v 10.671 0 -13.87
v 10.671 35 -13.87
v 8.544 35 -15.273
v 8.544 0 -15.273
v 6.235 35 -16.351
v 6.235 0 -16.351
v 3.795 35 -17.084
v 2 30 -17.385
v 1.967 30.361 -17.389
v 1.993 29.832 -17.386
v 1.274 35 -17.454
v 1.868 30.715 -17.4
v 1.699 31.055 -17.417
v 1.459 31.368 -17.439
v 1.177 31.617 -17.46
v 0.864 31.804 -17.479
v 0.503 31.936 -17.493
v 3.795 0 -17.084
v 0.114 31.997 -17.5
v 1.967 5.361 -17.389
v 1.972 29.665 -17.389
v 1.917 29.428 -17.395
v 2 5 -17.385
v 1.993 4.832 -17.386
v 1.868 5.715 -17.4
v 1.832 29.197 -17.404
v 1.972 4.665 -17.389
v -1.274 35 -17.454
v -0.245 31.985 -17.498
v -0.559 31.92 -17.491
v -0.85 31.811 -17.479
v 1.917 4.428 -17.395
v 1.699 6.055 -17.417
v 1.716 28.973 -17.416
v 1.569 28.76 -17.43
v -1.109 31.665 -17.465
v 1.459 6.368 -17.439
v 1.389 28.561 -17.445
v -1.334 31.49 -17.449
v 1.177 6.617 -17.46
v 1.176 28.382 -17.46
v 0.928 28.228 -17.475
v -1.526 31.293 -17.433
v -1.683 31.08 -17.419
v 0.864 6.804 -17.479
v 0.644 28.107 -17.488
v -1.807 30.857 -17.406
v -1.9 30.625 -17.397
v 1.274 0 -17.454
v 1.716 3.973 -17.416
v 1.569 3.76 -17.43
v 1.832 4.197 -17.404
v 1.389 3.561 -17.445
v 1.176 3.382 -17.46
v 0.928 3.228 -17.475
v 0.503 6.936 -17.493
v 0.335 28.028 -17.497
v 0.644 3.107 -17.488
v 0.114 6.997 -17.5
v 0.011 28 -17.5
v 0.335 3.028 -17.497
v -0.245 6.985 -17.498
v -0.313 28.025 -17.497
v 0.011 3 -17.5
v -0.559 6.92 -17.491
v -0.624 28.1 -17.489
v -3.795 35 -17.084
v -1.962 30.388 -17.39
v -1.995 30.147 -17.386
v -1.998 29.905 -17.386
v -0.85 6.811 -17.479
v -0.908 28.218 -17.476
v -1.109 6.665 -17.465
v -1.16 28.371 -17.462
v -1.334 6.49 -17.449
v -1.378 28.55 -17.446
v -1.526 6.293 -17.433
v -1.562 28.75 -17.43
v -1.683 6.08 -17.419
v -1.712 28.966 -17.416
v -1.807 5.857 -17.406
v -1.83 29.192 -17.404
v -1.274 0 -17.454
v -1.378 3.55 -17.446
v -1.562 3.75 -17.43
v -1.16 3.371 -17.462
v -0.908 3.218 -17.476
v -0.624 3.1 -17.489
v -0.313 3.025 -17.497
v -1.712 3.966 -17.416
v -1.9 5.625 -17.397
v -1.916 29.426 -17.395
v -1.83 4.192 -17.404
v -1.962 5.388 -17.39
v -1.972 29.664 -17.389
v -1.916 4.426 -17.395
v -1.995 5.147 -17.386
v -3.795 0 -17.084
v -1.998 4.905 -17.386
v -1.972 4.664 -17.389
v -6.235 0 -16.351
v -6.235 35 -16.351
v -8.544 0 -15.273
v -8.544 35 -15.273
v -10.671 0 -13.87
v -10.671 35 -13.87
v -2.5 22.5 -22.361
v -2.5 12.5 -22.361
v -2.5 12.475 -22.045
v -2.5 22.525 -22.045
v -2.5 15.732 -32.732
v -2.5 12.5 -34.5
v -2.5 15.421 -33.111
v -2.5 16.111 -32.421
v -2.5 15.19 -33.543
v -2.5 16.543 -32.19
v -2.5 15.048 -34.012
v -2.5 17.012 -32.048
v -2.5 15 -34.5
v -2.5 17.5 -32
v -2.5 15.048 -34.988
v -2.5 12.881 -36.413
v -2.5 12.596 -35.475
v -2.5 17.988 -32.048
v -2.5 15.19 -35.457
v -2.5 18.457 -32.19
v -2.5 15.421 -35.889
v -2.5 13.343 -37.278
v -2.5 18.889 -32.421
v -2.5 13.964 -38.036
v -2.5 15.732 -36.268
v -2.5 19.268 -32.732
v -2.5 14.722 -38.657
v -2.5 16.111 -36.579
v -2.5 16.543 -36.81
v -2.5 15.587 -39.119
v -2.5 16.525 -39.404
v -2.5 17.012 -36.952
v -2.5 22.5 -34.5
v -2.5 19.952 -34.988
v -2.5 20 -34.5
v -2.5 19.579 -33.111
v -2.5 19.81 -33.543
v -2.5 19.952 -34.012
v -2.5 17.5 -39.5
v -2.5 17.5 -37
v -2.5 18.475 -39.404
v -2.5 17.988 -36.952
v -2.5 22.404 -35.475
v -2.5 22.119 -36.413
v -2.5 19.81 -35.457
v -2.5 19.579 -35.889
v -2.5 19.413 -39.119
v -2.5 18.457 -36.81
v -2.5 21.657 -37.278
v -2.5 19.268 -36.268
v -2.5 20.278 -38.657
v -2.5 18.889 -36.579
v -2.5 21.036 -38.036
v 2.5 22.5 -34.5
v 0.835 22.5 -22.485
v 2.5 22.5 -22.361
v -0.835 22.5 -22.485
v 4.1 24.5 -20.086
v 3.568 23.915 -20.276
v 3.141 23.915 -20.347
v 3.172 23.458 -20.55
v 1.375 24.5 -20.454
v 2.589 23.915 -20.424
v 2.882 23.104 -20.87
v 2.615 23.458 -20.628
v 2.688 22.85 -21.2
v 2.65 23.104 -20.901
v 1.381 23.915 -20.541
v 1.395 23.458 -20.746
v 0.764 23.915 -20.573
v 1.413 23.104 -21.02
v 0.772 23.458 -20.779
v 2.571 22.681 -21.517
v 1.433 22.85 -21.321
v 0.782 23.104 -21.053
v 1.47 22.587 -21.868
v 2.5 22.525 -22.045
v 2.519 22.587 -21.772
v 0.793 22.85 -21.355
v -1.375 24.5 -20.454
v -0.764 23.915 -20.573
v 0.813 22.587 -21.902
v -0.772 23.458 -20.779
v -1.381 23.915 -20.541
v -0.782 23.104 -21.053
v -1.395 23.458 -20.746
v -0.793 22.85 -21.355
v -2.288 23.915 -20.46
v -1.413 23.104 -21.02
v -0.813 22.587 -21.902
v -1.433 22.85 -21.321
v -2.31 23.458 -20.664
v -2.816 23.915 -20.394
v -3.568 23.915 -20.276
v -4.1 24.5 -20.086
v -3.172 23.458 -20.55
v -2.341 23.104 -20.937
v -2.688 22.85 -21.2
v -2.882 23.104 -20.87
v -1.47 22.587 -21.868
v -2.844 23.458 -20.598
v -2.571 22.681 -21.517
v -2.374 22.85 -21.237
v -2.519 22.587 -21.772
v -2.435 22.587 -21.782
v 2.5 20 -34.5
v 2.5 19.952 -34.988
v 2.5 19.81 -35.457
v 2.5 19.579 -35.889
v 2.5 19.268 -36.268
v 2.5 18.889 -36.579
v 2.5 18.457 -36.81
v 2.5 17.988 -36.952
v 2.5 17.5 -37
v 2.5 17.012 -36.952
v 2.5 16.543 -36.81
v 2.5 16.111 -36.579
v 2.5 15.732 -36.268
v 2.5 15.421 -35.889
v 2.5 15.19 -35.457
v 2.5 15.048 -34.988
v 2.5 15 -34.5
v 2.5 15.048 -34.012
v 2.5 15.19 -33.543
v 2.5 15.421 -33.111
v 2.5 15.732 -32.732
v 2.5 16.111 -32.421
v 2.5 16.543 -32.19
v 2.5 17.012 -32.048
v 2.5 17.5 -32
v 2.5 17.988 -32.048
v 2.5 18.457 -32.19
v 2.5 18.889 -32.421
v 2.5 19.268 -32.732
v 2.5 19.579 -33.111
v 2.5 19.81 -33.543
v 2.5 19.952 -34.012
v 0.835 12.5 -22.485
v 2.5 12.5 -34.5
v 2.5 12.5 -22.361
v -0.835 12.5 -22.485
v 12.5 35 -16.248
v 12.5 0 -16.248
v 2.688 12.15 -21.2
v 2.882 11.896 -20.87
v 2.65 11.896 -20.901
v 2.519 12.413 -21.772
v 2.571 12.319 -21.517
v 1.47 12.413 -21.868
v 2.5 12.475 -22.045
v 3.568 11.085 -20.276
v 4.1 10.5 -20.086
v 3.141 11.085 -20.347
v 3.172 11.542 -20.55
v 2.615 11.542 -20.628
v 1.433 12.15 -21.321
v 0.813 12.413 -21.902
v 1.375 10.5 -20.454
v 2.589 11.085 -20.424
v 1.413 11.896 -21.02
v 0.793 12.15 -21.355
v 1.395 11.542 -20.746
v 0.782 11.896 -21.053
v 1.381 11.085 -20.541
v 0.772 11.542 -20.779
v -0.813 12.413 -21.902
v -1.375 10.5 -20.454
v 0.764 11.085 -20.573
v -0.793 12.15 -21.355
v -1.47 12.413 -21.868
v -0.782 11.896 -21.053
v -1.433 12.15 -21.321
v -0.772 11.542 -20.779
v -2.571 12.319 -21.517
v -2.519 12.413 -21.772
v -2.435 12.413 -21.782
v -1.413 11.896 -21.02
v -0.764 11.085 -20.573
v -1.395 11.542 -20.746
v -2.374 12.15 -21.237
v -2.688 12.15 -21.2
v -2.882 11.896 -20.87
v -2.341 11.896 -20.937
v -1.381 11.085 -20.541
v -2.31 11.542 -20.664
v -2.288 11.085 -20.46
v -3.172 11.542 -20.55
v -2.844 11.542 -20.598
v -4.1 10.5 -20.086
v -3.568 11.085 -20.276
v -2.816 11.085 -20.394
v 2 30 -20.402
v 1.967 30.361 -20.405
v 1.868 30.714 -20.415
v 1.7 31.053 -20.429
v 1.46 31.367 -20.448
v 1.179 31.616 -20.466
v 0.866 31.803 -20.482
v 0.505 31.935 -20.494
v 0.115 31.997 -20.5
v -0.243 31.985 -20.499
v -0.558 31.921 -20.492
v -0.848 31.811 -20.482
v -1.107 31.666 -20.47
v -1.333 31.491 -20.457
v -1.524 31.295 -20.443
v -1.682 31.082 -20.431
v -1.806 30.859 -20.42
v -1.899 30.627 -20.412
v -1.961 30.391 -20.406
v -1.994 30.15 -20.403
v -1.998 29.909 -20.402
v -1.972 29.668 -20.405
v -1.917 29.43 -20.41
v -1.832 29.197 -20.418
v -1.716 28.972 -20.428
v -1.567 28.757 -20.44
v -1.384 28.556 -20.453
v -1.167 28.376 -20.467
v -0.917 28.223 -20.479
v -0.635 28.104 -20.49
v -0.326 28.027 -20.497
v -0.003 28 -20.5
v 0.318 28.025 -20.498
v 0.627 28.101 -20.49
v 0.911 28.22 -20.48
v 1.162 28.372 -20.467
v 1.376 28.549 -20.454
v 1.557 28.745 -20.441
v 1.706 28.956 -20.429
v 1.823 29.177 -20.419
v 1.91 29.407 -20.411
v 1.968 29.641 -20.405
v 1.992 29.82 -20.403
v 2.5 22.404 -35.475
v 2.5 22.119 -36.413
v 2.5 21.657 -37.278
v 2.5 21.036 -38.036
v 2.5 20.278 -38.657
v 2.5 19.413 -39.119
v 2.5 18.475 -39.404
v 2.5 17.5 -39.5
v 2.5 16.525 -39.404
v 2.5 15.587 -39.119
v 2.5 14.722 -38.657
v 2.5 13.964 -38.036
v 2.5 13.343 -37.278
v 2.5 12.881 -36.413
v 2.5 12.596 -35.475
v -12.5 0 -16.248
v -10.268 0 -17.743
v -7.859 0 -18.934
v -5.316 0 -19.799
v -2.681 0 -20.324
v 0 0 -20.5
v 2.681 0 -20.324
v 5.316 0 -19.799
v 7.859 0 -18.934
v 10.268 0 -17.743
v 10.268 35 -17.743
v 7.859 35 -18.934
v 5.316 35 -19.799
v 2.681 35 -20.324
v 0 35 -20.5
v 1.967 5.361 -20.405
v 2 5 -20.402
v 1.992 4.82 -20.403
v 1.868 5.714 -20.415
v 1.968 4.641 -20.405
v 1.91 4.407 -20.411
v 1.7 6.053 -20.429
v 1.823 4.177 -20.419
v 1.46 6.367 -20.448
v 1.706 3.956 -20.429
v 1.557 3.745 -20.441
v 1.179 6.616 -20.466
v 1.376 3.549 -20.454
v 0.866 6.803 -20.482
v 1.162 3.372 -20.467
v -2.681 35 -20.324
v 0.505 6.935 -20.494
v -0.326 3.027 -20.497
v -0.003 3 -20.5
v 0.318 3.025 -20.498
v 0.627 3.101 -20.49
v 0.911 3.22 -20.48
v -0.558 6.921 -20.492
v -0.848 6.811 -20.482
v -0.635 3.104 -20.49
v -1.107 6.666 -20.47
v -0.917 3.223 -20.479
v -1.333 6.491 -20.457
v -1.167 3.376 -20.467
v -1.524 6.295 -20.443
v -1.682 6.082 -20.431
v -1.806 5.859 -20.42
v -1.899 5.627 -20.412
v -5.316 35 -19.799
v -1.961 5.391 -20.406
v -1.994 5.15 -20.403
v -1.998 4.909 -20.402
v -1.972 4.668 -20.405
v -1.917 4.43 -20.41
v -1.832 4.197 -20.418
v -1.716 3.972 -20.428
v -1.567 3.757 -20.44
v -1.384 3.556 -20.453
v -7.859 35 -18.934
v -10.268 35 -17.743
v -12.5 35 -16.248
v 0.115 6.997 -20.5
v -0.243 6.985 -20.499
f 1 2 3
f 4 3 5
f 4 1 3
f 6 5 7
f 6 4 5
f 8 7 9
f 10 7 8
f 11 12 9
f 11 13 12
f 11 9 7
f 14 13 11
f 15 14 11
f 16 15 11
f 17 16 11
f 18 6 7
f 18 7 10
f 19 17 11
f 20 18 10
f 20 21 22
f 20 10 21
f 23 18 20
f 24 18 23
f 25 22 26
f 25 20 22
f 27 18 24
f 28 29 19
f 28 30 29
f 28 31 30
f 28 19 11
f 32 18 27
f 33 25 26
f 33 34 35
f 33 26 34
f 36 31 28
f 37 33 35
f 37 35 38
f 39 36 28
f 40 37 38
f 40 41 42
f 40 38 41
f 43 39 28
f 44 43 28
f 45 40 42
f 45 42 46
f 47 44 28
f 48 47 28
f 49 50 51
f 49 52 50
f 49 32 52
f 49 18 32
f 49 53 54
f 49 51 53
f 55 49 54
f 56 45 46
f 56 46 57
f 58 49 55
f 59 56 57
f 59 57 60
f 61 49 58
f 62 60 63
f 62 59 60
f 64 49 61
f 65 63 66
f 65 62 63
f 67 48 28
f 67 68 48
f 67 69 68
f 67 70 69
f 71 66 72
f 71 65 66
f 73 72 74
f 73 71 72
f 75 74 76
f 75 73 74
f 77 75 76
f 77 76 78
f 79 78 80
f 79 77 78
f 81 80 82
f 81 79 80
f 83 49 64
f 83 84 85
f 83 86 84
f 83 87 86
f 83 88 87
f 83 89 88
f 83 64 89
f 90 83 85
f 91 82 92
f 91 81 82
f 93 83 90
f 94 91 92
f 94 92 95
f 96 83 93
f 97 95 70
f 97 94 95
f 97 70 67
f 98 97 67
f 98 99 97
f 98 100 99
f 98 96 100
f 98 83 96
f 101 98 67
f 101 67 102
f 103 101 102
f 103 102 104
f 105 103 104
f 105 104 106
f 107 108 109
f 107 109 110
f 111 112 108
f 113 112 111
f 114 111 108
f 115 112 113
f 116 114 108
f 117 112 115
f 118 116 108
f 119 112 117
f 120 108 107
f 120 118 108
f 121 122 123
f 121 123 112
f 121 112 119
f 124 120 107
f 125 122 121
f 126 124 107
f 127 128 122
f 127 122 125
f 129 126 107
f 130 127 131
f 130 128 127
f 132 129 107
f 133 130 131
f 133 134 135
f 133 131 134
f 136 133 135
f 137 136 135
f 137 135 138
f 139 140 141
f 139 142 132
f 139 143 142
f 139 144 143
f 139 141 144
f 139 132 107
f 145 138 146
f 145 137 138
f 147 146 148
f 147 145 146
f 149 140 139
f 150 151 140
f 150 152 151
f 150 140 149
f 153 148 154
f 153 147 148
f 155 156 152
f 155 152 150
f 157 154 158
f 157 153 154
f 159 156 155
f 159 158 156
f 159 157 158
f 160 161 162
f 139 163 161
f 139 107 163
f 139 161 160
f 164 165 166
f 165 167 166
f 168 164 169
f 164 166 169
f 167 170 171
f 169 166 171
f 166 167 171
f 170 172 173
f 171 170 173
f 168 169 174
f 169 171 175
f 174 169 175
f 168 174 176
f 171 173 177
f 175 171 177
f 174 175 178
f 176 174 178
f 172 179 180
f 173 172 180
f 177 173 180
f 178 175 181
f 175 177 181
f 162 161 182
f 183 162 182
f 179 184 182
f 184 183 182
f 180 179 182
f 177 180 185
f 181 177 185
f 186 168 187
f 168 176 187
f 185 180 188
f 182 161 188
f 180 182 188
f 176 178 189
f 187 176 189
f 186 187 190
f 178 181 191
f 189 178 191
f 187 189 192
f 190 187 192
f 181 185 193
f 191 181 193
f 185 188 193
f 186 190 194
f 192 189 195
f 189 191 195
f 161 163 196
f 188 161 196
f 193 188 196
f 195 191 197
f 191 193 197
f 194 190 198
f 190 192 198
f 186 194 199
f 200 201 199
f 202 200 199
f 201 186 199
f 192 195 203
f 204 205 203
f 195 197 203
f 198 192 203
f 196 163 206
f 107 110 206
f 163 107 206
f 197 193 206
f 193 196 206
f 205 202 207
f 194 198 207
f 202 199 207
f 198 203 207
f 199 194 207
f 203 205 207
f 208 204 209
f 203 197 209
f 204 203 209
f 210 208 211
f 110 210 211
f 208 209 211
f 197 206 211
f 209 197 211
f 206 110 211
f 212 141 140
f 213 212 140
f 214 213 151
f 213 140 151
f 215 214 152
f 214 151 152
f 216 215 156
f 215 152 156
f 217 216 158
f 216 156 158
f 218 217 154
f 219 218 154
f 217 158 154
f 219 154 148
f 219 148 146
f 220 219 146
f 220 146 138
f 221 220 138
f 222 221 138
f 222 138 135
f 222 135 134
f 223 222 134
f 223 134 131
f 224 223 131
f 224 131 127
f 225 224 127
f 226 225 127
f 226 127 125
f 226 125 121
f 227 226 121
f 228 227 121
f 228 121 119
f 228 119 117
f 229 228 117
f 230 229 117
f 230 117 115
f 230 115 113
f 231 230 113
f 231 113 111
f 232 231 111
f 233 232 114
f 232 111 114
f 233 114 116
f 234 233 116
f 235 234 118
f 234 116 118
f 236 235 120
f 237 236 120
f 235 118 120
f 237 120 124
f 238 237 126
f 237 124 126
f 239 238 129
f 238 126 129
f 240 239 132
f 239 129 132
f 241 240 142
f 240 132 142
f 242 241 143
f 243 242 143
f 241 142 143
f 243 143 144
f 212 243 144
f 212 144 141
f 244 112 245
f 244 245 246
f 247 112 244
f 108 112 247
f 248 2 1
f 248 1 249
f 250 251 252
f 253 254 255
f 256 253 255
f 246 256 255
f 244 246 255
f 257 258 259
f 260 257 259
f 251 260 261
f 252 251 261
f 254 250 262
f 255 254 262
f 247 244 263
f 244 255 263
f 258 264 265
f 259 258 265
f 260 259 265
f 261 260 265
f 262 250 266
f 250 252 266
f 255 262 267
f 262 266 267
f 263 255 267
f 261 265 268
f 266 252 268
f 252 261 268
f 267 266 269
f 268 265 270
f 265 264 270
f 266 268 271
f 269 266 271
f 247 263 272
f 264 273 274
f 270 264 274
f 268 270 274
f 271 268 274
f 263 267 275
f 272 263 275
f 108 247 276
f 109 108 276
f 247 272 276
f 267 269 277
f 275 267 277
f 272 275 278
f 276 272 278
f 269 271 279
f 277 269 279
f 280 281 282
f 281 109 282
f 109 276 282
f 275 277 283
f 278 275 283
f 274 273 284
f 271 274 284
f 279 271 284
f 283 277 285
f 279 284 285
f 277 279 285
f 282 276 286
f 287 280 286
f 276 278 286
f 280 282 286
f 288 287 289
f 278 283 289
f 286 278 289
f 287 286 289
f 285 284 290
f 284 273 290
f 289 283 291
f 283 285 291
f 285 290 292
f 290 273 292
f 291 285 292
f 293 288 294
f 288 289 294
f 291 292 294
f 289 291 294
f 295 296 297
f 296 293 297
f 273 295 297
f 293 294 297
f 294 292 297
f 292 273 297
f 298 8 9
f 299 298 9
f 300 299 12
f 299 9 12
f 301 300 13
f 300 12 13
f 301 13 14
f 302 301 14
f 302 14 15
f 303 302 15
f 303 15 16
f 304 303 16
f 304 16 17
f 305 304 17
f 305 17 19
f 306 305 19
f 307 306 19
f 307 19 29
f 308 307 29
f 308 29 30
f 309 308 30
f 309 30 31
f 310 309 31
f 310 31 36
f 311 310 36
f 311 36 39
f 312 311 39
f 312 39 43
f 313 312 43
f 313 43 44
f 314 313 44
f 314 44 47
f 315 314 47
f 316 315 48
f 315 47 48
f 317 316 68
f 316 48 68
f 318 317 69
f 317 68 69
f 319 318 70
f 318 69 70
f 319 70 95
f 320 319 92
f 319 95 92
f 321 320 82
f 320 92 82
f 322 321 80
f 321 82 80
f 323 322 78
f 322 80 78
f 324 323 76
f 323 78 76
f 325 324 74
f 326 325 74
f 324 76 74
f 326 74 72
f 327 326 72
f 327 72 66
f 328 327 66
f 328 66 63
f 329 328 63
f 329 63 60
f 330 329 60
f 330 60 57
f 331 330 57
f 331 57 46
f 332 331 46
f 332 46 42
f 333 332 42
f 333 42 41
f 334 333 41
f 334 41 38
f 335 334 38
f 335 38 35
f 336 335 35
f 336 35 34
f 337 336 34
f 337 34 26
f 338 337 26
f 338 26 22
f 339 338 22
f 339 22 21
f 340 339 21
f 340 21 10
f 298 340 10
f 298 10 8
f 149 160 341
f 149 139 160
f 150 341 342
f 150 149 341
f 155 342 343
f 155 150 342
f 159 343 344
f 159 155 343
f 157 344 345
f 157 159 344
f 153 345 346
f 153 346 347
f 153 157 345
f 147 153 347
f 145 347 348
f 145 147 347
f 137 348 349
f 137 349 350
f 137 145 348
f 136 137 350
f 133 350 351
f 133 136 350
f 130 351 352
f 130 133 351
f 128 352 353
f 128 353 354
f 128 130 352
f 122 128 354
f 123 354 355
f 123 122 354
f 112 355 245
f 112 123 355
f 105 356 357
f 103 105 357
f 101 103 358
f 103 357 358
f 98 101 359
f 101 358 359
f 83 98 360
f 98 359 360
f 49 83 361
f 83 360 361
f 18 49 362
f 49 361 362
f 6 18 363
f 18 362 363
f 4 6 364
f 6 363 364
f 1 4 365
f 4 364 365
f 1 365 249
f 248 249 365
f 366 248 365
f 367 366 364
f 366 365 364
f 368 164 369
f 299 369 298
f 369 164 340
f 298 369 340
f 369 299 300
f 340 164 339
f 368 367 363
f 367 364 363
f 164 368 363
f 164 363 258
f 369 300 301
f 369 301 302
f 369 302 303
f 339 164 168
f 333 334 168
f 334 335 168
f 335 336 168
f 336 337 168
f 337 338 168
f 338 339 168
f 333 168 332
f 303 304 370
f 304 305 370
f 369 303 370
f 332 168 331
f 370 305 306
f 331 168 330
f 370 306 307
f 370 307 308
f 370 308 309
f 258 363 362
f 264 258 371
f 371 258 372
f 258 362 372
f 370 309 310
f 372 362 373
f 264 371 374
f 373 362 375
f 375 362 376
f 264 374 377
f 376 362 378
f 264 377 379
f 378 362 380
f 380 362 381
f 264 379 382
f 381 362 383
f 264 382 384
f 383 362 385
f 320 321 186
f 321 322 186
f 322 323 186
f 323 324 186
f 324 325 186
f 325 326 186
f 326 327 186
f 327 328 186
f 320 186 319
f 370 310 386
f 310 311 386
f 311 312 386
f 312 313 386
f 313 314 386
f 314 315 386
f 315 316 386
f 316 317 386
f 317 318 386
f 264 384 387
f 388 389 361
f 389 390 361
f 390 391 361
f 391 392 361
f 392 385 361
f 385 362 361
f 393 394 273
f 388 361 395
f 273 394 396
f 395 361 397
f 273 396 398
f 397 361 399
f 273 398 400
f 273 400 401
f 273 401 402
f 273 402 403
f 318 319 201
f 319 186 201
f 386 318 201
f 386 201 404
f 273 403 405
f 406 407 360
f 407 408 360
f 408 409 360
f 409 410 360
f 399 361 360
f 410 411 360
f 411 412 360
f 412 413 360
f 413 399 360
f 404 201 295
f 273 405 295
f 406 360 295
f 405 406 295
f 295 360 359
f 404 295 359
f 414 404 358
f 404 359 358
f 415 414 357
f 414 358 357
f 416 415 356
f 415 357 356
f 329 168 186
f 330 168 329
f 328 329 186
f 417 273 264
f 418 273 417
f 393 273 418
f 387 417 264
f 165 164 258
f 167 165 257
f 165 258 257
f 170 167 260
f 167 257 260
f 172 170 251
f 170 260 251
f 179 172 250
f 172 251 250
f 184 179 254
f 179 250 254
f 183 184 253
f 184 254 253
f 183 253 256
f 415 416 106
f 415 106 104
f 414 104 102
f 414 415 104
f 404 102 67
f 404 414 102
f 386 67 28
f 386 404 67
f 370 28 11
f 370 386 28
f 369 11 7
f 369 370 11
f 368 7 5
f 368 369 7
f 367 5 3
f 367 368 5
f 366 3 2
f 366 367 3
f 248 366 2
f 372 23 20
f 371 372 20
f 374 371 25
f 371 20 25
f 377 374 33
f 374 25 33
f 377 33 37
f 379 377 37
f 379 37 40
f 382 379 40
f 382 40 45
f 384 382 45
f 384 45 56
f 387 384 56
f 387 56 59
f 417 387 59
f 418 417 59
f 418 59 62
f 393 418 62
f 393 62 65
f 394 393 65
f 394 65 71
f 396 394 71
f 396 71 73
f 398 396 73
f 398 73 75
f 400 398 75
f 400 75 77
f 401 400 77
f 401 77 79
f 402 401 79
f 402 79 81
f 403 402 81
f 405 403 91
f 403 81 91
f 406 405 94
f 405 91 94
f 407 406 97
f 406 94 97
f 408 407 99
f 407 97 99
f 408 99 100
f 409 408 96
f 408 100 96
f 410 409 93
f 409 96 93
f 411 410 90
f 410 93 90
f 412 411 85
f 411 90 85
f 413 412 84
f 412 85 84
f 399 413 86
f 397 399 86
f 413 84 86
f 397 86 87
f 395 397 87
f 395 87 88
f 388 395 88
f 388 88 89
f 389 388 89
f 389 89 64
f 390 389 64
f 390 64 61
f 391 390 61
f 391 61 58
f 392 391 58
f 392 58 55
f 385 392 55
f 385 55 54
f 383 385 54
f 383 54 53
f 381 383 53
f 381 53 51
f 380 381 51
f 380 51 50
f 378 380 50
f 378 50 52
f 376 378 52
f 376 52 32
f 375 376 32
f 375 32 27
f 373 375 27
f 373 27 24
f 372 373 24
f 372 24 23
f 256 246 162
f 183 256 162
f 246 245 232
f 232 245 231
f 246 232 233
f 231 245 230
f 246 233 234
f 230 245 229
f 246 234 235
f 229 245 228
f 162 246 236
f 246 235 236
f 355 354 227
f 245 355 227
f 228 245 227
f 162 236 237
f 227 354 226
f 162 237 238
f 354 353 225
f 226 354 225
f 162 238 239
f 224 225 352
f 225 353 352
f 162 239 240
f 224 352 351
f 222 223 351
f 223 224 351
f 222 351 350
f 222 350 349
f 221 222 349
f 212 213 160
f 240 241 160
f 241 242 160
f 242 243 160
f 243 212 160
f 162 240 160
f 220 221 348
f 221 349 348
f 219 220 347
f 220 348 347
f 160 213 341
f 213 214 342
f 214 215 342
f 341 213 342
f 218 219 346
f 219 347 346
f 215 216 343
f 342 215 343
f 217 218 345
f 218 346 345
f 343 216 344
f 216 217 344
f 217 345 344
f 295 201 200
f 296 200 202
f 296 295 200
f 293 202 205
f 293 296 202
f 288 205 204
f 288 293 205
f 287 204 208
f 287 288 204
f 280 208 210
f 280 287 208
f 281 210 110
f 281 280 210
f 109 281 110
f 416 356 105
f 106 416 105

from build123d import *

# Parameters (mm, degrees)
SKETCH2_R                = 20.5
SKETCH2_R_2              = 17.5
BOSS_EXTRUDE1_DEPTH      = 35
SKETCH3_OUTSIDE_W        = 56.546
SKETCH3_OUTSIDE_H        = 56.546
CUT_EXTRUDE1_DEPTH       = 46.447772223
SKETCH5_R                = 2
CUT_EXTRUDE2_DEPTH       = 43.444080859
BOSS_EXTRUDE2_DEPTH      = 2.5
BOSS_EXTRUDE2_DEPTH_BACK = 2.5
SKETCH10_R               = 2.5
CUT_EXTRUDE3_DEPTH       = 55.865745324
FILLET2_R                = 2


with BuildPart() as part:
    # Sketch2 → Boss-Extrude1 (new body)
    with BuildSketch(Plane(origin=(0, 0, 0), x_dir=(1, 0, 0), z_dir=(0, 1, 0))):
        Circle(SKETCH2_R)
        Circle(SKETCH2_R_2, mode=Mode.SUBTRACT)
    extrude(amount=BOSS_EXTRUDE1_DEPTH)

    # Sketch3 outside → Cut-Extrude1 (cut, through all)
    with BuildSketch(Plane(origin=(0, 35, 0), x_dir=(1, 0, 0), z_dir=(0, 1, 0))):
        Rectangle(SKETCH3_OUTSIDE_W, SKETCH3_OUTSIDE_H)
        with BuildLine():
            Line((0, 0), (12.5, 16.248076809))
            ThreePointArc((12.5, 16.248076809), (0, 20.5), (-12.5, 16.248076809))
            Line((-12.5, 16.248076809), (0, 0))
        make_face(mode=Mode.SUBTRACT)
    extrude(amount=-CUT_EXTRUDE1_DEPTH, mode=Mode.SUBTRACT)

    # Sketch5 → Cut-Extrude2 (cut, through all)
    with BuildSketch(Plane.XY):
        with Locations((0, 30)):
            Circle(SKETCH5_R)
        with Locations((0, 5)):
            Circle(SKETCH5_R)
    extrude(amount=-CUT_EXTRUDE2_DEPTH, mode=Mode.SUBTRACT)

    # Sketch7 → Boss-Extrude2 (add, two sides: drawn at the far end of the back side and taken through both)
    with BuildSketch(Plane(origin=(0, 15, 0), x_dir=(0, 1, 0), z_dir=(-1, 0, 0)).offset(-BOSS_EXTRUDE2_DEPTH_BACK)):
        with BuildLine():
            Line((-2.5, 34.5), (-2.5, 18.5))
            Line((-2.5, 18.5), (7.5, 18.5))
            Line((7.5, 18.5), (7.5, 34.5))
            ThreePointArc((7.5, 34.5), (2.5, 39.5), (-2.5, 34.5))
        make_face()
    extrude(amount=BOSS_EXTRUDE2_DEPTH + BOSS_EXTRUDE2_DEPTH_BACK)

    # Sketch10 → Cut-Extrude3 (cut, through all)
    with BuildSketch(Plane(origin=(-2.5, 0, 0), x_dir=(0, 1, 0), z_dir=(-1, 0, 0))):
        with Locations((17.5, 34.5)):
            Circle(SKETCH10_R)
    extrude(amount=-CUT_EXTRUDE3_DEPTH, mode=Mode.SUBTRACT)

    # Fillet2
    fillet2_edges = [part.edges().sort_by_distance(p)[0] for p in [
        (-2.5, 17.5, -20.346989949),
        (0, 22.5, -20.5),
        (2.5, 17.5, -20.346989949),
        (0, 12.5, -20.5),
    ]]
    fillet(fillet2_edges, radius=FILLET2_R)


solid = part.part
